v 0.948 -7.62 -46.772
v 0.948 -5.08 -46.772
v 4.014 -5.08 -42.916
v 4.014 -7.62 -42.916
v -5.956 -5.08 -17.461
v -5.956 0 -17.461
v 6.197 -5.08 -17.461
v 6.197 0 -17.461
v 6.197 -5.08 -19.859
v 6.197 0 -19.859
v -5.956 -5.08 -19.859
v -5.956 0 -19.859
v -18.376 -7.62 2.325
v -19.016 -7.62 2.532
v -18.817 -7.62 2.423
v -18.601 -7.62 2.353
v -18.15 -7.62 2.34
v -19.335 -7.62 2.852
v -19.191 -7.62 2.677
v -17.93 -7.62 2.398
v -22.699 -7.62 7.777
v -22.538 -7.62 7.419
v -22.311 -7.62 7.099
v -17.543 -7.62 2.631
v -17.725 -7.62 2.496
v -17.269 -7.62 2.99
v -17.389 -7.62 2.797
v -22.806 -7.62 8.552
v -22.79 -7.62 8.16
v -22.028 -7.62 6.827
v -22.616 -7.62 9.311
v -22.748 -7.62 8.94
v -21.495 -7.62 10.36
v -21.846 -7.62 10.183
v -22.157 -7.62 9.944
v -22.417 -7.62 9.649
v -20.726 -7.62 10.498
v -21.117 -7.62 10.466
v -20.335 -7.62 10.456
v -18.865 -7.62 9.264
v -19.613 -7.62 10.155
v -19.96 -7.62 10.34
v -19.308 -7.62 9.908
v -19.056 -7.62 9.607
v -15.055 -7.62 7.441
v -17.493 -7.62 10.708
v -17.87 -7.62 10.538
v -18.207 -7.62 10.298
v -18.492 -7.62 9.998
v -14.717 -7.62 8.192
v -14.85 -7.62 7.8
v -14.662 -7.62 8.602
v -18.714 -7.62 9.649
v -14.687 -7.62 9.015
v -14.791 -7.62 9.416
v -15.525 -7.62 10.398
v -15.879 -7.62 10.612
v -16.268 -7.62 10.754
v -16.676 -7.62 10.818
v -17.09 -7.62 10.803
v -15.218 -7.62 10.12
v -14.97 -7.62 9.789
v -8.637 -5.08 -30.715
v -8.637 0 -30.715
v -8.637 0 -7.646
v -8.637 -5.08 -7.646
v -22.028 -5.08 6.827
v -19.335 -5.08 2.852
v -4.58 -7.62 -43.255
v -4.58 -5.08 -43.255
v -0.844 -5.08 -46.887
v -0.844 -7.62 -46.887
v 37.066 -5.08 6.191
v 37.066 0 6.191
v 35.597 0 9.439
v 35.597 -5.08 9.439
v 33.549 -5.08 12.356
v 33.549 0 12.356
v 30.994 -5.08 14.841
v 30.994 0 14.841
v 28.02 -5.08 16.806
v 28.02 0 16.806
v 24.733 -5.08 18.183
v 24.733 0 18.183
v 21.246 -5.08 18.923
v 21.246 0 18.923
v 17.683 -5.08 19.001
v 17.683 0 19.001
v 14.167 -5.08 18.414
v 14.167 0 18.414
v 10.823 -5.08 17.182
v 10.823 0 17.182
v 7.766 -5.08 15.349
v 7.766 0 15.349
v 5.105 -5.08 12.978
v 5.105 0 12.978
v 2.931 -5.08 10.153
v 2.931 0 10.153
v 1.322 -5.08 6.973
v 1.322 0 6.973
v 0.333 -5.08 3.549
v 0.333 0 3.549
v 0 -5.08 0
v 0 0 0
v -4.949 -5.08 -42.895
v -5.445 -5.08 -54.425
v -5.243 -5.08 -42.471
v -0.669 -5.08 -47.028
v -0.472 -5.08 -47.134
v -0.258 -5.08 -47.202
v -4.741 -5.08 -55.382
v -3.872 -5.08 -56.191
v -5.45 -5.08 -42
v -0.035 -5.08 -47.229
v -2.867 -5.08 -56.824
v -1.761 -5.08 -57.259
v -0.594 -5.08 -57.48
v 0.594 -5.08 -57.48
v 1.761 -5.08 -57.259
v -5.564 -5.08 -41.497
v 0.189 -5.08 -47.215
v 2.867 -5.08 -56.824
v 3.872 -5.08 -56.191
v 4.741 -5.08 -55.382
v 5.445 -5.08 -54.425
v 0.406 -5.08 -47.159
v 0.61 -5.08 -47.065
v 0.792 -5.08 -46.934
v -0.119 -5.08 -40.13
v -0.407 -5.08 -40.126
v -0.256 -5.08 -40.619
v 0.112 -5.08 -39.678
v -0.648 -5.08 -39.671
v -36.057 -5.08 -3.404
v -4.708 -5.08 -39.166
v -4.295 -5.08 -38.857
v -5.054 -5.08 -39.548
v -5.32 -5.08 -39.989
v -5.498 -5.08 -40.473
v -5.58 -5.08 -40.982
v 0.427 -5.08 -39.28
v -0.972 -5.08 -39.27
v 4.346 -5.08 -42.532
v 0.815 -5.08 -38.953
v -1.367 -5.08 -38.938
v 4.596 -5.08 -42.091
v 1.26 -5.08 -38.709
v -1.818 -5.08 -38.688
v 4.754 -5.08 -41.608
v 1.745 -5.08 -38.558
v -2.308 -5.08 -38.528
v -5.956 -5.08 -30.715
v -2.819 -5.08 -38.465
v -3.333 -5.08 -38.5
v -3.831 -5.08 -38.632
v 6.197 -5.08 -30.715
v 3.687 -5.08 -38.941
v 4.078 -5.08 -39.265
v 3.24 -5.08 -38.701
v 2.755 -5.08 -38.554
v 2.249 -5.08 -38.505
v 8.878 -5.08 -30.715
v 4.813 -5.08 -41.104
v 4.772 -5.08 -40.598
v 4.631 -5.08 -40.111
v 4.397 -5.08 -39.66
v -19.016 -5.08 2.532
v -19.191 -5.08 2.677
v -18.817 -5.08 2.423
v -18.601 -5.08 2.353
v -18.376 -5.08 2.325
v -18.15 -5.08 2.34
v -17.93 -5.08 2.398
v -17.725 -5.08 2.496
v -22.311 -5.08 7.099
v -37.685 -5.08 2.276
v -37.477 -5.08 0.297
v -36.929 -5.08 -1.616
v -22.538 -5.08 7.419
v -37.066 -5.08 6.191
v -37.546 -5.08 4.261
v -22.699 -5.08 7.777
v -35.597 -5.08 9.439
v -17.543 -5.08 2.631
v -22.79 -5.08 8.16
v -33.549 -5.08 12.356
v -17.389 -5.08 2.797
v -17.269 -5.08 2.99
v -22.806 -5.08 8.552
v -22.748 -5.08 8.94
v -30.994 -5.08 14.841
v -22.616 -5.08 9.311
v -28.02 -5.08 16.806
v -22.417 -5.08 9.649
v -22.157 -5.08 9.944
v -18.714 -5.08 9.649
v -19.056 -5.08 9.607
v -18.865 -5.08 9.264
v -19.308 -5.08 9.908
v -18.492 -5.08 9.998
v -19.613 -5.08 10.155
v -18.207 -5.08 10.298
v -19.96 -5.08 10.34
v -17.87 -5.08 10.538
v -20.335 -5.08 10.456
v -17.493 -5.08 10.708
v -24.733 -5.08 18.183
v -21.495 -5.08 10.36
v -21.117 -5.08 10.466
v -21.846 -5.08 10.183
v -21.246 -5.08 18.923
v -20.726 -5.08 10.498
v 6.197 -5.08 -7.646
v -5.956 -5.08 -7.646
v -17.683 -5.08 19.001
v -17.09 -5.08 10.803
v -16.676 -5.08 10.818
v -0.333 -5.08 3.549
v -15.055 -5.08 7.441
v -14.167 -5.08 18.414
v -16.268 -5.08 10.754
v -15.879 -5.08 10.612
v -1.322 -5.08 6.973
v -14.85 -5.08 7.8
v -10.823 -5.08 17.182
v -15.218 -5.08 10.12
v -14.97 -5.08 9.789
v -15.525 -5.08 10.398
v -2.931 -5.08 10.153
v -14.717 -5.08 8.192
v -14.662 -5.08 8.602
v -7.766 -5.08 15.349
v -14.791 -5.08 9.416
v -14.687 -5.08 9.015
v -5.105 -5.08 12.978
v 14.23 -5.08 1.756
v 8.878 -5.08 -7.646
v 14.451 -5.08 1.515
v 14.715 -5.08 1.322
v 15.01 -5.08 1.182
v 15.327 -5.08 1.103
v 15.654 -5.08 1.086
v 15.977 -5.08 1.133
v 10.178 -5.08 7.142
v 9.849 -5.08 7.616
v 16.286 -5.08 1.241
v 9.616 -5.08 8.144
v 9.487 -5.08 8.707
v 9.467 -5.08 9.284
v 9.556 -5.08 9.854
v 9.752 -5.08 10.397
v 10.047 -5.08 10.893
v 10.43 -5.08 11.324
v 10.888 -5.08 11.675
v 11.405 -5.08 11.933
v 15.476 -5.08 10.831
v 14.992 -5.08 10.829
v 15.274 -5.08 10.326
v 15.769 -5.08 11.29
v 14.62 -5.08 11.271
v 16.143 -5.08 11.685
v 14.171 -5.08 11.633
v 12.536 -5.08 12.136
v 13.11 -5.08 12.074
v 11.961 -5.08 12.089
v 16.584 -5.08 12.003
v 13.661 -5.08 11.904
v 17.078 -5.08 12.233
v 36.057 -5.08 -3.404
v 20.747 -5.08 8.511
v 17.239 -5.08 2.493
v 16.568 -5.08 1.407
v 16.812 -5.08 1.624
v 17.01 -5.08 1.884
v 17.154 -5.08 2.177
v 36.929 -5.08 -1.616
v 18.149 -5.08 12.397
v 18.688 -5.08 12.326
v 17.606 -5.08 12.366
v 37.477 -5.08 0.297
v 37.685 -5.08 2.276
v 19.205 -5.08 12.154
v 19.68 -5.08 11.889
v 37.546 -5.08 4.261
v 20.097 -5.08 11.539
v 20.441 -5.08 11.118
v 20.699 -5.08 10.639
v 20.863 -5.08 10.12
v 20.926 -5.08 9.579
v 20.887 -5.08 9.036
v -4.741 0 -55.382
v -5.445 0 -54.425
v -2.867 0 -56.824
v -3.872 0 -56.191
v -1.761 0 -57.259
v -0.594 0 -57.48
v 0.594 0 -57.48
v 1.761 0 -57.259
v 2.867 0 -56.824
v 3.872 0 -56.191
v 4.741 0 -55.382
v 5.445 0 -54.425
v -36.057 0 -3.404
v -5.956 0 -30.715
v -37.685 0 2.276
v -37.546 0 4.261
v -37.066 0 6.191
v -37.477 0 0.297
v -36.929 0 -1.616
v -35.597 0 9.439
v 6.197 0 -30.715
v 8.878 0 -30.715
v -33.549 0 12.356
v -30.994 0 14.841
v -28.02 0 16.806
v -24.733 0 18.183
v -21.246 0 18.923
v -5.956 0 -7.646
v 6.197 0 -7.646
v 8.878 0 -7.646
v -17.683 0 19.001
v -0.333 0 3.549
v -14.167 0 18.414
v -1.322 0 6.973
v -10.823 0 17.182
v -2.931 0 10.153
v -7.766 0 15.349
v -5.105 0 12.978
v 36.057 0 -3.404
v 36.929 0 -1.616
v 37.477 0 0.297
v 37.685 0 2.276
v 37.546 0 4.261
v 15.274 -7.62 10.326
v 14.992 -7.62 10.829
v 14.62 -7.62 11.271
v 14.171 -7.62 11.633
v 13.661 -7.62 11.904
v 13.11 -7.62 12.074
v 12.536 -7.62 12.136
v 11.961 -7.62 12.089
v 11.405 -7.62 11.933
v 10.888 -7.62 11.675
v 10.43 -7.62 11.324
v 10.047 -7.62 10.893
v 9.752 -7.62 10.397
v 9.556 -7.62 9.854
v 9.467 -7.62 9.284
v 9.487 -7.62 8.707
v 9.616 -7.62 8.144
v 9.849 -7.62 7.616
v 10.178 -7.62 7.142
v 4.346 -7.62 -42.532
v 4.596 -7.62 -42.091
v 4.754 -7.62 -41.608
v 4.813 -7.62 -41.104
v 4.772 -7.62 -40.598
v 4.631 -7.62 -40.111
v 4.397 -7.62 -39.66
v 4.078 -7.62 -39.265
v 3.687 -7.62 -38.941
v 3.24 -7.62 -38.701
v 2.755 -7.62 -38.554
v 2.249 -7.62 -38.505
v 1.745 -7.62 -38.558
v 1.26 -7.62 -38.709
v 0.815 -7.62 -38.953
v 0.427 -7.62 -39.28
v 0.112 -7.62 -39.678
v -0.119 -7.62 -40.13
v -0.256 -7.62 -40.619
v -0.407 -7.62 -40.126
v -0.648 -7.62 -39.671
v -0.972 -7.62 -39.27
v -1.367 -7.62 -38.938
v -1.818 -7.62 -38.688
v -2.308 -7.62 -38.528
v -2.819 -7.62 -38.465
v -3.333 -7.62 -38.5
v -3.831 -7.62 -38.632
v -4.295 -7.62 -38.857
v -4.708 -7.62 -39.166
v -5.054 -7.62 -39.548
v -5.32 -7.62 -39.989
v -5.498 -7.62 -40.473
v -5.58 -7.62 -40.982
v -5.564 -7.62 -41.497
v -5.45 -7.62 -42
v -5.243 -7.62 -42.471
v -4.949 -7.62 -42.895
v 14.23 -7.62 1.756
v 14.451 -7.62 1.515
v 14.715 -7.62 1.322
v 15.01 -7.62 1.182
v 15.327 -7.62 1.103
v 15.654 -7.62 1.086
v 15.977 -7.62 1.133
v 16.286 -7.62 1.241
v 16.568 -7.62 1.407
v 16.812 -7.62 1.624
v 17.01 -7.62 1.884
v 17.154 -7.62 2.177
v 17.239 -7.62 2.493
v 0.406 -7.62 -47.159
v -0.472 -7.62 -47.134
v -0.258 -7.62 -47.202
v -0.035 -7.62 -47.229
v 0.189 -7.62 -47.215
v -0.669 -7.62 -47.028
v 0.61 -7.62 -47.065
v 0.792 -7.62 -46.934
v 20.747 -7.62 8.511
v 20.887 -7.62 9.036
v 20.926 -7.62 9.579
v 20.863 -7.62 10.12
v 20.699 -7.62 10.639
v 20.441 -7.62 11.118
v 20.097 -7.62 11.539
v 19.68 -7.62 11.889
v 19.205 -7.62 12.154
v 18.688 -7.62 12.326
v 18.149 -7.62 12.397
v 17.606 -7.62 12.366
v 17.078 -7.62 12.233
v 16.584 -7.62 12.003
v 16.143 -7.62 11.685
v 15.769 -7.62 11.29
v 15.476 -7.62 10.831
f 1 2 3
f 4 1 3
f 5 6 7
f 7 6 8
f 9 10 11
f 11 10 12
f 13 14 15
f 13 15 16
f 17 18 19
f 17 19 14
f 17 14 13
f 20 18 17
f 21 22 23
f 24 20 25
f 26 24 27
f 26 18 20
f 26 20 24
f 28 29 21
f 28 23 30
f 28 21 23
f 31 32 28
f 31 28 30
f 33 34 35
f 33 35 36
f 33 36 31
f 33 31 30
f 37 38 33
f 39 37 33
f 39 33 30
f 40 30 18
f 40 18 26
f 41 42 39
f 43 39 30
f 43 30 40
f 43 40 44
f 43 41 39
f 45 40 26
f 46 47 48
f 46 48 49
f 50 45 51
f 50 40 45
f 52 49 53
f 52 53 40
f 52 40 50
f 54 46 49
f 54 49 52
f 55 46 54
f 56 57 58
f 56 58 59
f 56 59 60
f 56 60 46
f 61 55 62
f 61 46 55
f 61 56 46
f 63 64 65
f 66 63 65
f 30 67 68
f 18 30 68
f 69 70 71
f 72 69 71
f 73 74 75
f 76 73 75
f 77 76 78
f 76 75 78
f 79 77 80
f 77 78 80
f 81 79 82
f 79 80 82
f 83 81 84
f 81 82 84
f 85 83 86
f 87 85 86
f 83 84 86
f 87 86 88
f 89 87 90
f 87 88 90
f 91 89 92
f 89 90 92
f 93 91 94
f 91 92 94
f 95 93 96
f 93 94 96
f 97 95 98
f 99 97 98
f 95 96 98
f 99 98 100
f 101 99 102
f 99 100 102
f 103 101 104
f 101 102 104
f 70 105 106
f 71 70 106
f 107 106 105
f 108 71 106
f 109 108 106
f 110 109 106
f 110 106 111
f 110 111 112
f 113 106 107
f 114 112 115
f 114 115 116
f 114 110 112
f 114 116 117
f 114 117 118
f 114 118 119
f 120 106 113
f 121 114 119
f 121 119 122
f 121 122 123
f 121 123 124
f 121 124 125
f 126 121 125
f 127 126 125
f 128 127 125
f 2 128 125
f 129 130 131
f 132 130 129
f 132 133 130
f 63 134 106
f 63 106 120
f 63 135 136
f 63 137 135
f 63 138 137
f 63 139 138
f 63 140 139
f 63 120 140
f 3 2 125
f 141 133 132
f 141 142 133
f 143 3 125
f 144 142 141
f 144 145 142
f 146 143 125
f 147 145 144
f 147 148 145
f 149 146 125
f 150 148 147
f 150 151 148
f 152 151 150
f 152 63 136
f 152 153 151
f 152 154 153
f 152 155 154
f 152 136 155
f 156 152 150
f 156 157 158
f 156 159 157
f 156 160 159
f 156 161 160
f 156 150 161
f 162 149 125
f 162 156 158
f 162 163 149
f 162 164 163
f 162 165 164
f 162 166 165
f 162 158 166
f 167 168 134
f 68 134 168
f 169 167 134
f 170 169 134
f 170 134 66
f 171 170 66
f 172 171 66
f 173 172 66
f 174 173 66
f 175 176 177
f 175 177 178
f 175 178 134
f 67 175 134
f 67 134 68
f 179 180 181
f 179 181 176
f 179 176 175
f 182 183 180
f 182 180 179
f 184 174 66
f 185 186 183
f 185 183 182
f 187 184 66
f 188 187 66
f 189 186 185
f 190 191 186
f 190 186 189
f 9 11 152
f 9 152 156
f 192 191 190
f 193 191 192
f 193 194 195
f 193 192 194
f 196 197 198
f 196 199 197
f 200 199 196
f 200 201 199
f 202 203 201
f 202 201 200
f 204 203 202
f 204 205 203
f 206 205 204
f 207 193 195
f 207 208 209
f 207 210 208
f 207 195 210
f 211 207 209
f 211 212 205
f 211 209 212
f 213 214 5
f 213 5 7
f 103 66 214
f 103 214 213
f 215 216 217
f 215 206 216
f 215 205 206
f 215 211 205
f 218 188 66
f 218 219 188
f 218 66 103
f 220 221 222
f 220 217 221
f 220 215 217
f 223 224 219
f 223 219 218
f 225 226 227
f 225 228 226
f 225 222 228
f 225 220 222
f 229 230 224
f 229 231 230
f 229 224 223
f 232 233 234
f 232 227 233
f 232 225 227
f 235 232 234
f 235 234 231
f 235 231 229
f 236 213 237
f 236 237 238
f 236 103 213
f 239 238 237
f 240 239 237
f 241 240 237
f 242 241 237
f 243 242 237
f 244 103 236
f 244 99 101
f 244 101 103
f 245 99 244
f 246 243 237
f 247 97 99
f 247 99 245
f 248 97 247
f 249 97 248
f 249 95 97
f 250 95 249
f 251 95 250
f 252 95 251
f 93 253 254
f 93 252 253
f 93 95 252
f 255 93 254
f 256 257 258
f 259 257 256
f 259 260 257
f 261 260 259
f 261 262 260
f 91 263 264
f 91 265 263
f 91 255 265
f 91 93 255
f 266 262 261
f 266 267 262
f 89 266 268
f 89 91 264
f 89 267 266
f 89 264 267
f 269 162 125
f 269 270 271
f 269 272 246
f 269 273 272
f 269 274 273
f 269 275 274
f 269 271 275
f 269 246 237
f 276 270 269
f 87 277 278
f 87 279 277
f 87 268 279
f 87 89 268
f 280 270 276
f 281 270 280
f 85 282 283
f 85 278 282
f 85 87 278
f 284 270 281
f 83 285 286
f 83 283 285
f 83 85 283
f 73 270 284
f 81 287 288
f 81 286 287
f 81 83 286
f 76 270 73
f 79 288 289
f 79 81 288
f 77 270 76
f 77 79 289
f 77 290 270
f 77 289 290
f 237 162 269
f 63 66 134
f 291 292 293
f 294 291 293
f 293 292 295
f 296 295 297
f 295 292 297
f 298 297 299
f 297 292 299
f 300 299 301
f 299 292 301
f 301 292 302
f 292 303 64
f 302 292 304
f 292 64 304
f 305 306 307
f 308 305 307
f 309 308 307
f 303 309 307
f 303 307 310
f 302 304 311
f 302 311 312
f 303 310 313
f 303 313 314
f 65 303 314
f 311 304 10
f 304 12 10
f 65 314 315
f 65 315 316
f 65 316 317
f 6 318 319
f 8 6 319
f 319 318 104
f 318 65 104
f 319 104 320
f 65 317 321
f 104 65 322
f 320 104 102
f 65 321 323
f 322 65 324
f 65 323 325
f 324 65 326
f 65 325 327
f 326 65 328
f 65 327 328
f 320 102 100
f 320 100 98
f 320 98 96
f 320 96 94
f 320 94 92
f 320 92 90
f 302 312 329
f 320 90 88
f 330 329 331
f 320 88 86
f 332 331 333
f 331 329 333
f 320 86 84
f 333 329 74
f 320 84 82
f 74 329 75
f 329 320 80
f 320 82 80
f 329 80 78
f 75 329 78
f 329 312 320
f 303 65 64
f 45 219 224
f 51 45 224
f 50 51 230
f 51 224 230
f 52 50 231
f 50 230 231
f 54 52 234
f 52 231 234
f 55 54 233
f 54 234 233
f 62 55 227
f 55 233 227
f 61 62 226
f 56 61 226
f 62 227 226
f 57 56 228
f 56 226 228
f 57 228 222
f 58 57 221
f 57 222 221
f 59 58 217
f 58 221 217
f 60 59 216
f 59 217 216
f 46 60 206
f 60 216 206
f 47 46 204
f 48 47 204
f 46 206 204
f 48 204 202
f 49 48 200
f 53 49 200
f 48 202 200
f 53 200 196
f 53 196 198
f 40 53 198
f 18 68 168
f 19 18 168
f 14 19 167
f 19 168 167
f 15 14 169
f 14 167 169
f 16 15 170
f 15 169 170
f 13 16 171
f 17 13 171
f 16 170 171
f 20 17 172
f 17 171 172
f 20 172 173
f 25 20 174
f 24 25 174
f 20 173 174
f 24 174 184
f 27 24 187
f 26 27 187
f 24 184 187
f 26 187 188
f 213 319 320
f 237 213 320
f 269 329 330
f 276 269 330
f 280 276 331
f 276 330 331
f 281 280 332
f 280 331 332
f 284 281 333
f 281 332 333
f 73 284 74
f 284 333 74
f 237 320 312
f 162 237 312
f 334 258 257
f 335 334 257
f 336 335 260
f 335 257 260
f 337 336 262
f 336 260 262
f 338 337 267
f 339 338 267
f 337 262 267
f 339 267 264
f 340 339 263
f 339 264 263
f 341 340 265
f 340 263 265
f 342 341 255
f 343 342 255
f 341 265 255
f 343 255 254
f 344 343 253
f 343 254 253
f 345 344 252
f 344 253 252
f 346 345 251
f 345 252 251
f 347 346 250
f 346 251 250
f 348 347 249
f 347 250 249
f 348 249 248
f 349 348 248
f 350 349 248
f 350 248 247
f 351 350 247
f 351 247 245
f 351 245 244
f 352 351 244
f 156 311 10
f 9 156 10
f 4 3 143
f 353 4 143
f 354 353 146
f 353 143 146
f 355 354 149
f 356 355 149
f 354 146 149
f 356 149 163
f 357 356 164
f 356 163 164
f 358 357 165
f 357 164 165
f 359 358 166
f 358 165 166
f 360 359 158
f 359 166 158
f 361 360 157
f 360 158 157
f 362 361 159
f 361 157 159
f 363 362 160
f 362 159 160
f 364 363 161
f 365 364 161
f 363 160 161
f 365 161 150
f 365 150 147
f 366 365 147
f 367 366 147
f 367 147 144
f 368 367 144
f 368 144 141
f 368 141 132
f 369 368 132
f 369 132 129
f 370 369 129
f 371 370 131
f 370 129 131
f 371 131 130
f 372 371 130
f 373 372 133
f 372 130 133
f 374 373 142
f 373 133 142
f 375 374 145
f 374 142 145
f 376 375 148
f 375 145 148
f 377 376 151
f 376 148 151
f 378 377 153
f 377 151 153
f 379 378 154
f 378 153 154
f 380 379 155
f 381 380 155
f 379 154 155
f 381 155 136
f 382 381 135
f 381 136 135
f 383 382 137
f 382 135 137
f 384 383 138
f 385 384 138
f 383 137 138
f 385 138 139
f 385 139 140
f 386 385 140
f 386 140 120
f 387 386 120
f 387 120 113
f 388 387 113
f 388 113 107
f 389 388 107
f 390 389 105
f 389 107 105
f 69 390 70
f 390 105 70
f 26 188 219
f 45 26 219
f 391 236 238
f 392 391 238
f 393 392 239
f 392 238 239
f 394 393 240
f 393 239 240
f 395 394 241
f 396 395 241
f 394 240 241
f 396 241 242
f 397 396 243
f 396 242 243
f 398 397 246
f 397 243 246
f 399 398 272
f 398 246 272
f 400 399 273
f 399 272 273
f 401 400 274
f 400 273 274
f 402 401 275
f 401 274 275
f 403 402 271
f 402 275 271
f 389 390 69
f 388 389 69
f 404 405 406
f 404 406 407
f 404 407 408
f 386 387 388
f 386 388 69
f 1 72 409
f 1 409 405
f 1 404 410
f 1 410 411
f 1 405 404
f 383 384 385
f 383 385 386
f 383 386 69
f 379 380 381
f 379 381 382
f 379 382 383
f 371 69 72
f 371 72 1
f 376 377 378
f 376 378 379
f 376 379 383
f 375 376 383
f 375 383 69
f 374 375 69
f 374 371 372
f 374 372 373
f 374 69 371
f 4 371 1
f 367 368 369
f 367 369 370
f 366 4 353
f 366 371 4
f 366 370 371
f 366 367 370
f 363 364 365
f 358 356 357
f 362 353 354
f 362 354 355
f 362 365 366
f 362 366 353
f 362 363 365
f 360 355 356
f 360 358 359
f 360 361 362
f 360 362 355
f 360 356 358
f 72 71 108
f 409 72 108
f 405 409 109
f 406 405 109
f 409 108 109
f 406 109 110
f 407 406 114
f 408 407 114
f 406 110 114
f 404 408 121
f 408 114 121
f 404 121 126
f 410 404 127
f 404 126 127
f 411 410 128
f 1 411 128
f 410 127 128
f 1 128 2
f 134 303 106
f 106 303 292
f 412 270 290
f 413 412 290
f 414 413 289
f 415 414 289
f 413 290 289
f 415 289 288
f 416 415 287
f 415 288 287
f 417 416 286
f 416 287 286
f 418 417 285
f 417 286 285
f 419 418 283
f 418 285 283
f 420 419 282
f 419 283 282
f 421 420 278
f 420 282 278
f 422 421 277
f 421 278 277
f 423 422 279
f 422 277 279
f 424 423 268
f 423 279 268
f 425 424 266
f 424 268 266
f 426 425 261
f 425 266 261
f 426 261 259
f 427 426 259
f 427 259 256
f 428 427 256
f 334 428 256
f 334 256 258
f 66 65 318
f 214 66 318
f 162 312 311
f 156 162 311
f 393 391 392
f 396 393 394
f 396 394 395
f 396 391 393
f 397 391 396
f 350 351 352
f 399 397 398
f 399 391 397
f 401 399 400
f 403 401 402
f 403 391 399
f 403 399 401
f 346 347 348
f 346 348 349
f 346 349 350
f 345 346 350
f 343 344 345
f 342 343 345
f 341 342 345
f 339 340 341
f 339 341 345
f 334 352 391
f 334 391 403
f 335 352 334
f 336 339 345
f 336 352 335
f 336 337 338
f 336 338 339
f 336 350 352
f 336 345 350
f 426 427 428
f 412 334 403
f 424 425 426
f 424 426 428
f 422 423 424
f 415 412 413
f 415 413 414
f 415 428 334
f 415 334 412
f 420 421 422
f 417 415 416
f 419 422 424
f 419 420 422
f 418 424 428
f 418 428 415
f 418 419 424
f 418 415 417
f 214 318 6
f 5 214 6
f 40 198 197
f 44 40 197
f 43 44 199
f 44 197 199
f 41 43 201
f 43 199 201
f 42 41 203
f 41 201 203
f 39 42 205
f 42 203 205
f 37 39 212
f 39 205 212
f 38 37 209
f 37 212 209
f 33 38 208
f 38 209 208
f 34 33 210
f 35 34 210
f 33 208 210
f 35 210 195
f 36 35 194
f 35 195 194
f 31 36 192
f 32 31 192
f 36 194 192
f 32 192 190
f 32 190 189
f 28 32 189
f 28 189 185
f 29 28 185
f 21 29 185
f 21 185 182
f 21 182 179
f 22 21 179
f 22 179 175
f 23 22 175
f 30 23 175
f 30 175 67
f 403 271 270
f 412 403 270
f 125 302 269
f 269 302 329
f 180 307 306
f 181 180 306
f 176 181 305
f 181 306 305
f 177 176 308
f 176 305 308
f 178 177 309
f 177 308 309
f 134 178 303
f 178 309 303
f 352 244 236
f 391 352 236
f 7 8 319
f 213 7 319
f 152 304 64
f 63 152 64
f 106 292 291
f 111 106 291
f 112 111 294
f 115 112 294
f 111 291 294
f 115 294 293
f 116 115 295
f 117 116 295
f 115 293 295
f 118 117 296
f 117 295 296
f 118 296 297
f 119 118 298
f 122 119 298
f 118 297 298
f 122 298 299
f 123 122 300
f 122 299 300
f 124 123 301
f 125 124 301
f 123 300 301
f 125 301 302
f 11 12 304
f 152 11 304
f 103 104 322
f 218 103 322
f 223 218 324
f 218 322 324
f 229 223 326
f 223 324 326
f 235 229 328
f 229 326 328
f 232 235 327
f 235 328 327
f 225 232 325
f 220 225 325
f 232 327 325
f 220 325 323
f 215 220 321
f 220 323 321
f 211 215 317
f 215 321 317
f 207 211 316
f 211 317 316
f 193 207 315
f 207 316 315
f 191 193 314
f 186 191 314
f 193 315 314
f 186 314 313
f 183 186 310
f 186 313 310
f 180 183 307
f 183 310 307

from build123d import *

# Parameters (mm, degrees)
F1_DEPTH = 5.08
F3_DEPTH = 2.54


with BuildPart() as f1:
    # F0 (on Front) → F1 (new body)
    with BuildSketch(Plane.XZ):
        with BuildLine():
            ThreePointArc((36.0574860958, -3.4041898403), (37.6237458991, 1.2819140519), (37.0658548873, 6.1912416105))
            ThreePointArc((37.0658548873, 6.1912416105), (15.9114920426, 18.7896851438), (0, 0))
            ThreePointArc((0, 0), (-15.9114920426, 18.7896851438), (-37.0658548873, 6.1912416105))
            ThreePointArc((-37.0658548873, 6.1912416105), (-37.6237458991, 1.2819140519), (-36.0574860958, -3.4041898403))
            Line((-36.0574860958, -3.4041898403), (-5.4450800783, -54.4248665362))
            ThreePointArc((-5.4450800783, -54.4248665362), (0, -57.5078184892), (5.4450800783, -54.4248665362))
            Line((5.4450800783, -54.4248665362), (36.0574860958, -3.4041898403))
        make_face()
        Polygon((8.8775694707, -7.6457064603), (8.8775694707, -30.7146664709), (6.1965412883, -30.7146664709), (6.1965412883, -19.8592792915), (-5.9564433354, -19.8592792915), (-5.9564433354, -30.7146664709), (-8.6374715178, -30.7146664709), (-8.6374715178, -7.6457064603), (-5.9564433354, -7.6457064603), (-5.9564433354, -17.4609960774), (6.1965412883, -17.4609960774), (6.1965412883, -7.6457064603), align=None, mode=Mode.SUBTRACT)
    extrude(amount=F1_DEPTH)

    # F2 (on face) → F3 (join)
    with BuildSketch(Plane.XZ.offset(5.08)):
        with BuildLine():
            ThreePointArc((4.0135957961, -42.9156825927), (3.4697843517, -38.8100018767), (-0.2558416024, -40.6188844818))
            ThreePointArc((-0.2558416024, -40.6188844818), (-4.2951963256, -38.8570498508), (-4.5797577389, -43.2547165786))
            Line((-4.5797577389, -43.2547165786), (-0.8440466673, -46.8867695822))
            ThreePointArc((-0.8440466673, -46.8867695822), (0.0773147032, -47.2269785686), (0.9478044693, -46.7721198031))
            Line((0.9478044693, -46.7721198031), (4.0135957961, -42.9156825927))
        make_face()
        with BuildLine():
            ThreePointArc((20.7469986095, 8.5107093396), (18.9506843874, 12.2523134557), (15.2743776915, 10.3258879514))
            ThreePointArc((15.2743776915, 10.3258879514), (10.8884034591, 11.6753417762), (10.1780788442, 7.1417742478))
            Line((10.1780788442, 7.1417742478), (14.230393121, 1.7562222549))
            ThreePointArc((14.230393121, 1.7562222549), (15.9774408389, 1.1327705758), (17.2386550324, 2.4929935292))
            Line((17.2386550324, 2.4929935292), (20.7469986095, 8.5107093396))
        make_face()
        with BuildLine():
            ThreePointArc((-15.0549625712, 7.4408553073), (-15.8788156154, 10.6122074591), (-18.8651549438, 9.2638804494))
            ThreePointArc((-18.8651549438, 9.2638804494), (-22.0074043435, 10.0708263721), (-22.0279623721, 6.8266823587))
            Line((-22.0279623721, 6.8266823587), (-19.3354653916, 2.851523468))
            ThreePointArc((-19.3354653916, 2.851523468), (-18.2623978414, 2.3275004132), (-17.2688172647, 2.9899743876))
            Line((-17.2688172647, 2.9899743876), (-15.0549625712, 7.4408553073))
        make_face()
    extrude(amount=F3_DEPTH)


solid = f1.part
